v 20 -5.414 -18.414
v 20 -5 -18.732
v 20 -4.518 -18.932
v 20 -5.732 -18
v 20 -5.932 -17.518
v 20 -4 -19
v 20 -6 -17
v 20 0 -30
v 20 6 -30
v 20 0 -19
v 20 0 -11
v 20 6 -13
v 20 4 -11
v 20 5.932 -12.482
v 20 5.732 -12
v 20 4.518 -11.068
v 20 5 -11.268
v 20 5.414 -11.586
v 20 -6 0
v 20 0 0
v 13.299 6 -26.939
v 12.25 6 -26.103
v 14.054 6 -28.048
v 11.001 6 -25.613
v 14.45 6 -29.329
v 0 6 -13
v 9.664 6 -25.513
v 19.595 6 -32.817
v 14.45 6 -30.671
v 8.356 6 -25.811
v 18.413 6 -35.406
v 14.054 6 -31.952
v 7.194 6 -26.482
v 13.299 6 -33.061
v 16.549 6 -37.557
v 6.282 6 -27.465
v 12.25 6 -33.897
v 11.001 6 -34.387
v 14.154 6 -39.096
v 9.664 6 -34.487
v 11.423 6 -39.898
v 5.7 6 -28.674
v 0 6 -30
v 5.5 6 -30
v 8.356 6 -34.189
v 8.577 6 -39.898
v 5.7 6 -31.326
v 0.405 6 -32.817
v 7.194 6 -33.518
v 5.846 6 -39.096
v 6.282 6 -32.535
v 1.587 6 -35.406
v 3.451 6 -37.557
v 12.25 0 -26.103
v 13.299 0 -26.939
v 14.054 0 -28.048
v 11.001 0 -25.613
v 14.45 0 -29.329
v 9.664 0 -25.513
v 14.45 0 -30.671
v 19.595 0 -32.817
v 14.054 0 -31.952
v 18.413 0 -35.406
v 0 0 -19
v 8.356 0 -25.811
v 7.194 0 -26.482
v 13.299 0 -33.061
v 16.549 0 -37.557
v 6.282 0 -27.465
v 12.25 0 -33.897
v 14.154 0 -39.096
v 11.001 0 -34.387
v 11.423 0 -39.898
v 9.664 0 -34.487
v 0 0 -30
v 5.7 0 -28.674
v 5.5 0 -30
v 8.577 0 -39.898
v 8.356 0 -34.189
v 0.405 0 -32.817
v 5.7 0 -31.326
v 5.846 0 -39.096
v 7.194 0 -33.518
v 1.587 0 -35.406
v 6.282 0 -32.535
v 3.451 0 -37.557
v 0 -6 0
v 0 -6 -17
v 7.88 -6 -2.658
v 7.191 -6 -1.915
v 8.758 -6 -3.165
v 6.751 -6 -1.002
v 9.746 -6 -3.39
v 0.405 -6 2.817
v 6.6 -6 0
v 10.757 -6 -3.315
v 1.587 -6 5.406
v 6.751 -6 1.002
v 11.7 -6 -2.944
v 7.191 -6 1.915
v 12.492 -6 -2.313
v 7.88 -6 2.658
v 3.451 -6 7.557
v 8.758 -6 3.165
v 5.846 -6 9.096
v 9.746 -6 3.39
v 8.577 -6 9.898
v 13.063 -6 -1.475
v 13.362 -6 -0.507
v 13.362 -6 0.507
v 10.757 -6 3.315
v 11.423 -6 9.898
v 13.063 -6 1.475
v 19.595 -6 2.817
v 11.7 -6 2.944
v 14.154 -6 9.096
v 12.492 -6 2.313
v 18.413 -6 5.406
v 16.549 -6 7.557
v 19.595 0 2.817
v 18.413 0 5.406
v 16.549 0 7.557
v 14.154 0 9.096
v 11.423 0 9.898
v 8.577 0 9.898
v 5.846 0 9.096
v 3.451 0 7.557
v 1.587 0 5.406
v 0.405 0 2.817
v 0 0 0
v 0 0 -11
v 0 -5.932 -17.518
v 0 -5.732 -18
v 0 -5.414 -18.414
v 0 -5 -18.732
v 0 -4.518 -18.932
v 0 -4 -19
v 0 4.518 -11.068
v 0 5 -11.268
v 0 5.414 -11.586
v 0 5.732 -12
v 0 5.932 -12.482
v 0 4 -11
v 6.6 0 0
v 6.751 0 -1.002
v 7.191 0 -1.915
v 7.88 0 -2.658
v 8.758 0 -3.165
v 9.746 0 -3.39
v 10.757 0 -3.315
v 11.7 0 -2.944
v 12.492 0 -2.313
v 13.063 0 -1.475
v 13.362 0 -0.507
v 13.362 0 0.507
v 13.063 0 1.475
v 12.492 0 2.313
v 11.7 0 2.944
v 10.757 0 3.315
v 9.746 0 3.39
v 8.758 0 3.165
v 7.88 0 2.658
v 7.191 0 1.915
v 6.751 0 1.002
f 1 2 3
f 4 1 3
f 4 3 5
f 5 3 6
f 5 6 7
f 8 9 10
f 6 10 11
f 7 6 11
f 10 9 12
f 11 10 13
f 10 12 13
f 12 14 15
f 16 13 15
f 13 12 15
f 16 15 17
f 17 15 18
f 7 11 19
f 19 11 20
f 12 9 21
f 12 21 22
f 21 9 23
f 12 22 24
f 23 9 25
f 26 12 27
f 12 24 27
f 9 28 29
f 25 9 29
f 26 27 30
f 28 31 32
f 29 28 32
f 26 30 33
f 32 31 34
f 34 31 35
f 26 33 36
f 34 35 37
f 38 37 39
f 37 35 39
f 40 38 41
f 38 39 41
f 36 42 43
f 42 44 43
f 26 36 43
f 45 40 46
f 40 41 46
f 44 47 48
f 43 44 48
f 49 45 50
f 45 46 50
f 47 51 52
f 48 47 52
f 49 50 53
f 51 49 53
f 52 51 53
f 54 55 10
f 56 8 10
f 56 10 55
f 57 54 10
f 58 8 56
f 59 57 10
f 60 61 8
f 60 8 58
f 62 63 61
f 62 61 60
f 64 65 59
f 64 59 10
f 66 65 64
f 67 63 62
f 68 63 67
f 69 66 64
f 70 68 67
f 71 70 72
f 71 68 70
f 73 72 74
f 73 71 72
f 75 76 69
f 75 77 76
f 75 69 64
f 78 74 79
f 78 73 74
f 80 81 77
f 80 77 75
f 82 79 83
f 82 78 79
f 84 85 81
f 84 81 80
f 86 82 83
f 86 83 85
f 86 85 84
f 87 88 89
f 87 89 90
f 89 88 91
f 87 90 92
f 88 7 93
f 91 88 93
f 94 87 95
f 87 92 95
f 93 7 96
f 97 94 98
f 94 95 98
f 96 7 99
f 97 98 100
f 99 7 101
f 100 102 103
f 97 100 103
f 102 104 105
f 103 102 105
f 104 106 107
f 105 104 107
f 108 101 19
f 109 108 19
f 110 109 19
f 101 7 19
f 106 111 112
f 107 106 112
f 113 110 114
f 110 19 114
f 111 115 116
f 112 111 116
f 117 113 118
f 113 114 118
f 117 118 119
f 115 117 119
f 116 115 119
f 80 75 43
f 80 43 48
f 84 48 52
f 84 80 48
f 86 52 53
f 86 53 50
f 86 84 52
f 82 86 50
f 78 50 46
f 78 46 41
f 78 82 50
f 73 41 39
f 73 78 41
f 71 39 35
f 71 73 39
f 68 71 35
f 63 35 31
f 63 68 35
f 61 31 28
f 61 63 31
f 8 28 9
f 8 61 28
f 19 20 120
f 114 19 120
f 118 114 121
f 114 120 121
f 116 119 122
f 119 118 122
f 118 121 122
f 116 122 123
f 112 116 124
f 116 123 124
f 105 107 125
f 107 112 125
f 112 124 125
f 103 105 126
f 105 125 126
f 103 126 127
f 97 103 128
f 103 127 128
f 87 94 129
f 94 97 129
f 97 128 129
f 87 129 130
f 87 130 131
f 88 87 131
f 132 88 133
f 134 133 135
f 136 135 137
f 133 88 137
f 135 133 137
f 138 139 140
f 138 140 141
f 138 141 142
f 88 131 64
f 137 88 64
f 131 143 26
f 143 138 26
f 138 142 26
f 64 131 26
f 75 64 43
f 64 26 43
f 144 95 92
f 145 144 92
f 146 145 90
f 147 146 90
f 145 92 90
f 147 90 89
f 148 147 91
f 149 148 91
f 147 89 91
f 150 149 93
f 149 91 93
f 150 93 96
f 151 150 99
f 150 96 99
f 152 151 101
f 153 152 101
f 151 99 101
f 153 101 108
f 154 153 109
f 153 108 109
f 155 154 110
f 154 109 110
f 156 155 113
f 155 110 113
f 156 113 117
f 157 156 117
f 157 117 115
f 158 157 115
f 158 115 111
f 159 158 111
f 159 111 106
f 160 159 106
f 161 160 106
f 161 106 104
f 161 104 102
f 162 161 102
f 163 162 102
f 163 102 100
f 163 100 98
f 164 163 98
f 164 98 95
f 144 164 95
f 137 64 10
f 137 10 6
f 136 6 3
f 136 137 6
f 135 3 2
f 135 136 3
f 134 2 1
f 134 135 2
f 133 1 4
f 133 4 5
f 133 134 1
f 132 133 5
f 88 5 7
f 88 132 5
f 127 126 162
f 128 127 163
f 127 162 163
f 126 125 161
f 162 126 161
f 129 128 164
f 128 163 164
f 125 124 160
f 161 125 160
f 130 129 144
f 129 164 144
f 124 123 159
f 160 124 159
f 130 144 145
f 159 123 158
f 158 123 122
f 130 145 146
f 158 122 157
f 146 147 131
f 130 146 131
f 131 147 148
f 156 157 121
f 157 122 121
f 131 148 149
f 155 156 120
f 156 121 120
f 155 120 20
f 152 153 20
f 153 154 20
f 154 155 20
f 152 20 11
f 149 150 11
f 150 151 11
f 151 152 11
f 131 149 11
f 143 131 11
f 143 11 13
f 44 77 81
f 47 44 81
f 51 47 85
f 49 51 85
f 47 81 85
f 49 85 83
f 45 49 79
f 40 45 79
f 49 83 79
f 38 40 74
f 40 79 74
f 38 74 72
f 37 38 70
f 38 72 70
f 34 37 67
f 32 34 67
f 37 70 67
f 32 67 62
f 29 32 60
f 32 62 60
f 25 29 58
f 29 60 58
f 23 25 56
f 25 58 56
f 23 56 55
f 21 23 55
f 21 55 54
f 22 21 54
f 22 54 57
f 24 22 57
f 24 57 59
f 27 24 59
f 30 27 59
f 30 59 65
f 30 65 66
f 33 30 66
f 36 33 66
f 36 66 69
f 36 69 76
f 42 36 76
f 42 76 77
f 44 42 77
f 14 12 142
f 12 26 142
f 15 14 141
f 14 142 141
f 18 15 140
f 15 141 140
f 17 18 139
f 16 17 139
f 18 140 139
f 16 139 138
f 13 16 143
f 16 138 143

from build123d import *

# Parameters (mm, degrees)
BOSS_EXTRU_1_DEPTH      = 6
BOSS_EXTRU_2_DEPTH      = 12
ESQUISSE14_W            = 21
ESQUISSE14_H            = 6
ENL_V_MAT_EXTRU_2_DEPTH = 21
D_GAGEMENT_M81_D        = 9
TROU_TARAUD_M82_D       = 6.8
CONG_1_R                = 2


with BuildPart() as part:
    # Esquisse1 → Boss.-Extru.1 (new body)
    with BuildSketch(Plane(origin=(0, 0, 0), x_dir=(1, 0, 0), z_dir=(0, 1, 0))):
        with BuildLine():
            Line((0, 0), (0, 30))
            ThreePointArc((0, 30), (10, 40), (20, 30))
            Line((20, 30), (20, 0))
            ThreePointArc((20, 0), (10, -10), (0, 0))
        make_face()
    extrude(amount=BOSS_EXTRU_1_DEPTH)

    # Esquisse12 → Boss.-Extru.2 (add)
    with BuildSketch(Plane.XZ):
        with BuildLine():
            Line((0, -30), (20, -30))
            Line((20, -30), (20, 0))
            ThreePointArc((20, 0), (10, 10), (0, 0))
            Line((0, 0), (0, -30))
        make_face()
    extrude(amount=BOSS_EXTRU_2_DEPTH)

    # Esquisse14 → Enlèv. mat.-Extru.2 (cut, through all)
    with BuildSketch(Plane(origin=(20, 0, 0), x_dir=(0, 0, -1), z_dir=(1, 0, 0))):
        with Locations((0.5, 3)):
            Rectangle(ESQUISSE14_W, ESQUISSE14_H)
        Polygon((30, 0), (19, 0), (19, -6), (-10, -6), (-10, -12), (30, -12), align=None)
    extrude(amount=-ENL_V_MAT_EXTRU_2_DEPTH, mode=Mode.SUBTRACT)

    # Dégagement M81 (through all)
    with Locations(Plane(origin=(0, 6, 0), x_dir=(1, 0, 0), z_dir=(0, 1, 0))):
        with Locations((10, 30)):
            Hole(D_GAGEMENT_M81_D / 2)

    # Trou taraudé M82 (through all)
    with Locations(Plane(origin=(0, 0, 0), x_dir=(1, 0, 0), z_dir=(0, 1, 0))):
        with Locations((10, 0)):
            Hole(TROU_TARAUD_M82_D / 2)

    # Congé1
    cong_1_edges = [part.edges().sort_by_distance(p)[0] for p in [
        (10, -6, -19),
        (10, 6, -11),
    ]]
    fillet(cong_1_edges, radius=CONG_1_R)


solid = part.part
